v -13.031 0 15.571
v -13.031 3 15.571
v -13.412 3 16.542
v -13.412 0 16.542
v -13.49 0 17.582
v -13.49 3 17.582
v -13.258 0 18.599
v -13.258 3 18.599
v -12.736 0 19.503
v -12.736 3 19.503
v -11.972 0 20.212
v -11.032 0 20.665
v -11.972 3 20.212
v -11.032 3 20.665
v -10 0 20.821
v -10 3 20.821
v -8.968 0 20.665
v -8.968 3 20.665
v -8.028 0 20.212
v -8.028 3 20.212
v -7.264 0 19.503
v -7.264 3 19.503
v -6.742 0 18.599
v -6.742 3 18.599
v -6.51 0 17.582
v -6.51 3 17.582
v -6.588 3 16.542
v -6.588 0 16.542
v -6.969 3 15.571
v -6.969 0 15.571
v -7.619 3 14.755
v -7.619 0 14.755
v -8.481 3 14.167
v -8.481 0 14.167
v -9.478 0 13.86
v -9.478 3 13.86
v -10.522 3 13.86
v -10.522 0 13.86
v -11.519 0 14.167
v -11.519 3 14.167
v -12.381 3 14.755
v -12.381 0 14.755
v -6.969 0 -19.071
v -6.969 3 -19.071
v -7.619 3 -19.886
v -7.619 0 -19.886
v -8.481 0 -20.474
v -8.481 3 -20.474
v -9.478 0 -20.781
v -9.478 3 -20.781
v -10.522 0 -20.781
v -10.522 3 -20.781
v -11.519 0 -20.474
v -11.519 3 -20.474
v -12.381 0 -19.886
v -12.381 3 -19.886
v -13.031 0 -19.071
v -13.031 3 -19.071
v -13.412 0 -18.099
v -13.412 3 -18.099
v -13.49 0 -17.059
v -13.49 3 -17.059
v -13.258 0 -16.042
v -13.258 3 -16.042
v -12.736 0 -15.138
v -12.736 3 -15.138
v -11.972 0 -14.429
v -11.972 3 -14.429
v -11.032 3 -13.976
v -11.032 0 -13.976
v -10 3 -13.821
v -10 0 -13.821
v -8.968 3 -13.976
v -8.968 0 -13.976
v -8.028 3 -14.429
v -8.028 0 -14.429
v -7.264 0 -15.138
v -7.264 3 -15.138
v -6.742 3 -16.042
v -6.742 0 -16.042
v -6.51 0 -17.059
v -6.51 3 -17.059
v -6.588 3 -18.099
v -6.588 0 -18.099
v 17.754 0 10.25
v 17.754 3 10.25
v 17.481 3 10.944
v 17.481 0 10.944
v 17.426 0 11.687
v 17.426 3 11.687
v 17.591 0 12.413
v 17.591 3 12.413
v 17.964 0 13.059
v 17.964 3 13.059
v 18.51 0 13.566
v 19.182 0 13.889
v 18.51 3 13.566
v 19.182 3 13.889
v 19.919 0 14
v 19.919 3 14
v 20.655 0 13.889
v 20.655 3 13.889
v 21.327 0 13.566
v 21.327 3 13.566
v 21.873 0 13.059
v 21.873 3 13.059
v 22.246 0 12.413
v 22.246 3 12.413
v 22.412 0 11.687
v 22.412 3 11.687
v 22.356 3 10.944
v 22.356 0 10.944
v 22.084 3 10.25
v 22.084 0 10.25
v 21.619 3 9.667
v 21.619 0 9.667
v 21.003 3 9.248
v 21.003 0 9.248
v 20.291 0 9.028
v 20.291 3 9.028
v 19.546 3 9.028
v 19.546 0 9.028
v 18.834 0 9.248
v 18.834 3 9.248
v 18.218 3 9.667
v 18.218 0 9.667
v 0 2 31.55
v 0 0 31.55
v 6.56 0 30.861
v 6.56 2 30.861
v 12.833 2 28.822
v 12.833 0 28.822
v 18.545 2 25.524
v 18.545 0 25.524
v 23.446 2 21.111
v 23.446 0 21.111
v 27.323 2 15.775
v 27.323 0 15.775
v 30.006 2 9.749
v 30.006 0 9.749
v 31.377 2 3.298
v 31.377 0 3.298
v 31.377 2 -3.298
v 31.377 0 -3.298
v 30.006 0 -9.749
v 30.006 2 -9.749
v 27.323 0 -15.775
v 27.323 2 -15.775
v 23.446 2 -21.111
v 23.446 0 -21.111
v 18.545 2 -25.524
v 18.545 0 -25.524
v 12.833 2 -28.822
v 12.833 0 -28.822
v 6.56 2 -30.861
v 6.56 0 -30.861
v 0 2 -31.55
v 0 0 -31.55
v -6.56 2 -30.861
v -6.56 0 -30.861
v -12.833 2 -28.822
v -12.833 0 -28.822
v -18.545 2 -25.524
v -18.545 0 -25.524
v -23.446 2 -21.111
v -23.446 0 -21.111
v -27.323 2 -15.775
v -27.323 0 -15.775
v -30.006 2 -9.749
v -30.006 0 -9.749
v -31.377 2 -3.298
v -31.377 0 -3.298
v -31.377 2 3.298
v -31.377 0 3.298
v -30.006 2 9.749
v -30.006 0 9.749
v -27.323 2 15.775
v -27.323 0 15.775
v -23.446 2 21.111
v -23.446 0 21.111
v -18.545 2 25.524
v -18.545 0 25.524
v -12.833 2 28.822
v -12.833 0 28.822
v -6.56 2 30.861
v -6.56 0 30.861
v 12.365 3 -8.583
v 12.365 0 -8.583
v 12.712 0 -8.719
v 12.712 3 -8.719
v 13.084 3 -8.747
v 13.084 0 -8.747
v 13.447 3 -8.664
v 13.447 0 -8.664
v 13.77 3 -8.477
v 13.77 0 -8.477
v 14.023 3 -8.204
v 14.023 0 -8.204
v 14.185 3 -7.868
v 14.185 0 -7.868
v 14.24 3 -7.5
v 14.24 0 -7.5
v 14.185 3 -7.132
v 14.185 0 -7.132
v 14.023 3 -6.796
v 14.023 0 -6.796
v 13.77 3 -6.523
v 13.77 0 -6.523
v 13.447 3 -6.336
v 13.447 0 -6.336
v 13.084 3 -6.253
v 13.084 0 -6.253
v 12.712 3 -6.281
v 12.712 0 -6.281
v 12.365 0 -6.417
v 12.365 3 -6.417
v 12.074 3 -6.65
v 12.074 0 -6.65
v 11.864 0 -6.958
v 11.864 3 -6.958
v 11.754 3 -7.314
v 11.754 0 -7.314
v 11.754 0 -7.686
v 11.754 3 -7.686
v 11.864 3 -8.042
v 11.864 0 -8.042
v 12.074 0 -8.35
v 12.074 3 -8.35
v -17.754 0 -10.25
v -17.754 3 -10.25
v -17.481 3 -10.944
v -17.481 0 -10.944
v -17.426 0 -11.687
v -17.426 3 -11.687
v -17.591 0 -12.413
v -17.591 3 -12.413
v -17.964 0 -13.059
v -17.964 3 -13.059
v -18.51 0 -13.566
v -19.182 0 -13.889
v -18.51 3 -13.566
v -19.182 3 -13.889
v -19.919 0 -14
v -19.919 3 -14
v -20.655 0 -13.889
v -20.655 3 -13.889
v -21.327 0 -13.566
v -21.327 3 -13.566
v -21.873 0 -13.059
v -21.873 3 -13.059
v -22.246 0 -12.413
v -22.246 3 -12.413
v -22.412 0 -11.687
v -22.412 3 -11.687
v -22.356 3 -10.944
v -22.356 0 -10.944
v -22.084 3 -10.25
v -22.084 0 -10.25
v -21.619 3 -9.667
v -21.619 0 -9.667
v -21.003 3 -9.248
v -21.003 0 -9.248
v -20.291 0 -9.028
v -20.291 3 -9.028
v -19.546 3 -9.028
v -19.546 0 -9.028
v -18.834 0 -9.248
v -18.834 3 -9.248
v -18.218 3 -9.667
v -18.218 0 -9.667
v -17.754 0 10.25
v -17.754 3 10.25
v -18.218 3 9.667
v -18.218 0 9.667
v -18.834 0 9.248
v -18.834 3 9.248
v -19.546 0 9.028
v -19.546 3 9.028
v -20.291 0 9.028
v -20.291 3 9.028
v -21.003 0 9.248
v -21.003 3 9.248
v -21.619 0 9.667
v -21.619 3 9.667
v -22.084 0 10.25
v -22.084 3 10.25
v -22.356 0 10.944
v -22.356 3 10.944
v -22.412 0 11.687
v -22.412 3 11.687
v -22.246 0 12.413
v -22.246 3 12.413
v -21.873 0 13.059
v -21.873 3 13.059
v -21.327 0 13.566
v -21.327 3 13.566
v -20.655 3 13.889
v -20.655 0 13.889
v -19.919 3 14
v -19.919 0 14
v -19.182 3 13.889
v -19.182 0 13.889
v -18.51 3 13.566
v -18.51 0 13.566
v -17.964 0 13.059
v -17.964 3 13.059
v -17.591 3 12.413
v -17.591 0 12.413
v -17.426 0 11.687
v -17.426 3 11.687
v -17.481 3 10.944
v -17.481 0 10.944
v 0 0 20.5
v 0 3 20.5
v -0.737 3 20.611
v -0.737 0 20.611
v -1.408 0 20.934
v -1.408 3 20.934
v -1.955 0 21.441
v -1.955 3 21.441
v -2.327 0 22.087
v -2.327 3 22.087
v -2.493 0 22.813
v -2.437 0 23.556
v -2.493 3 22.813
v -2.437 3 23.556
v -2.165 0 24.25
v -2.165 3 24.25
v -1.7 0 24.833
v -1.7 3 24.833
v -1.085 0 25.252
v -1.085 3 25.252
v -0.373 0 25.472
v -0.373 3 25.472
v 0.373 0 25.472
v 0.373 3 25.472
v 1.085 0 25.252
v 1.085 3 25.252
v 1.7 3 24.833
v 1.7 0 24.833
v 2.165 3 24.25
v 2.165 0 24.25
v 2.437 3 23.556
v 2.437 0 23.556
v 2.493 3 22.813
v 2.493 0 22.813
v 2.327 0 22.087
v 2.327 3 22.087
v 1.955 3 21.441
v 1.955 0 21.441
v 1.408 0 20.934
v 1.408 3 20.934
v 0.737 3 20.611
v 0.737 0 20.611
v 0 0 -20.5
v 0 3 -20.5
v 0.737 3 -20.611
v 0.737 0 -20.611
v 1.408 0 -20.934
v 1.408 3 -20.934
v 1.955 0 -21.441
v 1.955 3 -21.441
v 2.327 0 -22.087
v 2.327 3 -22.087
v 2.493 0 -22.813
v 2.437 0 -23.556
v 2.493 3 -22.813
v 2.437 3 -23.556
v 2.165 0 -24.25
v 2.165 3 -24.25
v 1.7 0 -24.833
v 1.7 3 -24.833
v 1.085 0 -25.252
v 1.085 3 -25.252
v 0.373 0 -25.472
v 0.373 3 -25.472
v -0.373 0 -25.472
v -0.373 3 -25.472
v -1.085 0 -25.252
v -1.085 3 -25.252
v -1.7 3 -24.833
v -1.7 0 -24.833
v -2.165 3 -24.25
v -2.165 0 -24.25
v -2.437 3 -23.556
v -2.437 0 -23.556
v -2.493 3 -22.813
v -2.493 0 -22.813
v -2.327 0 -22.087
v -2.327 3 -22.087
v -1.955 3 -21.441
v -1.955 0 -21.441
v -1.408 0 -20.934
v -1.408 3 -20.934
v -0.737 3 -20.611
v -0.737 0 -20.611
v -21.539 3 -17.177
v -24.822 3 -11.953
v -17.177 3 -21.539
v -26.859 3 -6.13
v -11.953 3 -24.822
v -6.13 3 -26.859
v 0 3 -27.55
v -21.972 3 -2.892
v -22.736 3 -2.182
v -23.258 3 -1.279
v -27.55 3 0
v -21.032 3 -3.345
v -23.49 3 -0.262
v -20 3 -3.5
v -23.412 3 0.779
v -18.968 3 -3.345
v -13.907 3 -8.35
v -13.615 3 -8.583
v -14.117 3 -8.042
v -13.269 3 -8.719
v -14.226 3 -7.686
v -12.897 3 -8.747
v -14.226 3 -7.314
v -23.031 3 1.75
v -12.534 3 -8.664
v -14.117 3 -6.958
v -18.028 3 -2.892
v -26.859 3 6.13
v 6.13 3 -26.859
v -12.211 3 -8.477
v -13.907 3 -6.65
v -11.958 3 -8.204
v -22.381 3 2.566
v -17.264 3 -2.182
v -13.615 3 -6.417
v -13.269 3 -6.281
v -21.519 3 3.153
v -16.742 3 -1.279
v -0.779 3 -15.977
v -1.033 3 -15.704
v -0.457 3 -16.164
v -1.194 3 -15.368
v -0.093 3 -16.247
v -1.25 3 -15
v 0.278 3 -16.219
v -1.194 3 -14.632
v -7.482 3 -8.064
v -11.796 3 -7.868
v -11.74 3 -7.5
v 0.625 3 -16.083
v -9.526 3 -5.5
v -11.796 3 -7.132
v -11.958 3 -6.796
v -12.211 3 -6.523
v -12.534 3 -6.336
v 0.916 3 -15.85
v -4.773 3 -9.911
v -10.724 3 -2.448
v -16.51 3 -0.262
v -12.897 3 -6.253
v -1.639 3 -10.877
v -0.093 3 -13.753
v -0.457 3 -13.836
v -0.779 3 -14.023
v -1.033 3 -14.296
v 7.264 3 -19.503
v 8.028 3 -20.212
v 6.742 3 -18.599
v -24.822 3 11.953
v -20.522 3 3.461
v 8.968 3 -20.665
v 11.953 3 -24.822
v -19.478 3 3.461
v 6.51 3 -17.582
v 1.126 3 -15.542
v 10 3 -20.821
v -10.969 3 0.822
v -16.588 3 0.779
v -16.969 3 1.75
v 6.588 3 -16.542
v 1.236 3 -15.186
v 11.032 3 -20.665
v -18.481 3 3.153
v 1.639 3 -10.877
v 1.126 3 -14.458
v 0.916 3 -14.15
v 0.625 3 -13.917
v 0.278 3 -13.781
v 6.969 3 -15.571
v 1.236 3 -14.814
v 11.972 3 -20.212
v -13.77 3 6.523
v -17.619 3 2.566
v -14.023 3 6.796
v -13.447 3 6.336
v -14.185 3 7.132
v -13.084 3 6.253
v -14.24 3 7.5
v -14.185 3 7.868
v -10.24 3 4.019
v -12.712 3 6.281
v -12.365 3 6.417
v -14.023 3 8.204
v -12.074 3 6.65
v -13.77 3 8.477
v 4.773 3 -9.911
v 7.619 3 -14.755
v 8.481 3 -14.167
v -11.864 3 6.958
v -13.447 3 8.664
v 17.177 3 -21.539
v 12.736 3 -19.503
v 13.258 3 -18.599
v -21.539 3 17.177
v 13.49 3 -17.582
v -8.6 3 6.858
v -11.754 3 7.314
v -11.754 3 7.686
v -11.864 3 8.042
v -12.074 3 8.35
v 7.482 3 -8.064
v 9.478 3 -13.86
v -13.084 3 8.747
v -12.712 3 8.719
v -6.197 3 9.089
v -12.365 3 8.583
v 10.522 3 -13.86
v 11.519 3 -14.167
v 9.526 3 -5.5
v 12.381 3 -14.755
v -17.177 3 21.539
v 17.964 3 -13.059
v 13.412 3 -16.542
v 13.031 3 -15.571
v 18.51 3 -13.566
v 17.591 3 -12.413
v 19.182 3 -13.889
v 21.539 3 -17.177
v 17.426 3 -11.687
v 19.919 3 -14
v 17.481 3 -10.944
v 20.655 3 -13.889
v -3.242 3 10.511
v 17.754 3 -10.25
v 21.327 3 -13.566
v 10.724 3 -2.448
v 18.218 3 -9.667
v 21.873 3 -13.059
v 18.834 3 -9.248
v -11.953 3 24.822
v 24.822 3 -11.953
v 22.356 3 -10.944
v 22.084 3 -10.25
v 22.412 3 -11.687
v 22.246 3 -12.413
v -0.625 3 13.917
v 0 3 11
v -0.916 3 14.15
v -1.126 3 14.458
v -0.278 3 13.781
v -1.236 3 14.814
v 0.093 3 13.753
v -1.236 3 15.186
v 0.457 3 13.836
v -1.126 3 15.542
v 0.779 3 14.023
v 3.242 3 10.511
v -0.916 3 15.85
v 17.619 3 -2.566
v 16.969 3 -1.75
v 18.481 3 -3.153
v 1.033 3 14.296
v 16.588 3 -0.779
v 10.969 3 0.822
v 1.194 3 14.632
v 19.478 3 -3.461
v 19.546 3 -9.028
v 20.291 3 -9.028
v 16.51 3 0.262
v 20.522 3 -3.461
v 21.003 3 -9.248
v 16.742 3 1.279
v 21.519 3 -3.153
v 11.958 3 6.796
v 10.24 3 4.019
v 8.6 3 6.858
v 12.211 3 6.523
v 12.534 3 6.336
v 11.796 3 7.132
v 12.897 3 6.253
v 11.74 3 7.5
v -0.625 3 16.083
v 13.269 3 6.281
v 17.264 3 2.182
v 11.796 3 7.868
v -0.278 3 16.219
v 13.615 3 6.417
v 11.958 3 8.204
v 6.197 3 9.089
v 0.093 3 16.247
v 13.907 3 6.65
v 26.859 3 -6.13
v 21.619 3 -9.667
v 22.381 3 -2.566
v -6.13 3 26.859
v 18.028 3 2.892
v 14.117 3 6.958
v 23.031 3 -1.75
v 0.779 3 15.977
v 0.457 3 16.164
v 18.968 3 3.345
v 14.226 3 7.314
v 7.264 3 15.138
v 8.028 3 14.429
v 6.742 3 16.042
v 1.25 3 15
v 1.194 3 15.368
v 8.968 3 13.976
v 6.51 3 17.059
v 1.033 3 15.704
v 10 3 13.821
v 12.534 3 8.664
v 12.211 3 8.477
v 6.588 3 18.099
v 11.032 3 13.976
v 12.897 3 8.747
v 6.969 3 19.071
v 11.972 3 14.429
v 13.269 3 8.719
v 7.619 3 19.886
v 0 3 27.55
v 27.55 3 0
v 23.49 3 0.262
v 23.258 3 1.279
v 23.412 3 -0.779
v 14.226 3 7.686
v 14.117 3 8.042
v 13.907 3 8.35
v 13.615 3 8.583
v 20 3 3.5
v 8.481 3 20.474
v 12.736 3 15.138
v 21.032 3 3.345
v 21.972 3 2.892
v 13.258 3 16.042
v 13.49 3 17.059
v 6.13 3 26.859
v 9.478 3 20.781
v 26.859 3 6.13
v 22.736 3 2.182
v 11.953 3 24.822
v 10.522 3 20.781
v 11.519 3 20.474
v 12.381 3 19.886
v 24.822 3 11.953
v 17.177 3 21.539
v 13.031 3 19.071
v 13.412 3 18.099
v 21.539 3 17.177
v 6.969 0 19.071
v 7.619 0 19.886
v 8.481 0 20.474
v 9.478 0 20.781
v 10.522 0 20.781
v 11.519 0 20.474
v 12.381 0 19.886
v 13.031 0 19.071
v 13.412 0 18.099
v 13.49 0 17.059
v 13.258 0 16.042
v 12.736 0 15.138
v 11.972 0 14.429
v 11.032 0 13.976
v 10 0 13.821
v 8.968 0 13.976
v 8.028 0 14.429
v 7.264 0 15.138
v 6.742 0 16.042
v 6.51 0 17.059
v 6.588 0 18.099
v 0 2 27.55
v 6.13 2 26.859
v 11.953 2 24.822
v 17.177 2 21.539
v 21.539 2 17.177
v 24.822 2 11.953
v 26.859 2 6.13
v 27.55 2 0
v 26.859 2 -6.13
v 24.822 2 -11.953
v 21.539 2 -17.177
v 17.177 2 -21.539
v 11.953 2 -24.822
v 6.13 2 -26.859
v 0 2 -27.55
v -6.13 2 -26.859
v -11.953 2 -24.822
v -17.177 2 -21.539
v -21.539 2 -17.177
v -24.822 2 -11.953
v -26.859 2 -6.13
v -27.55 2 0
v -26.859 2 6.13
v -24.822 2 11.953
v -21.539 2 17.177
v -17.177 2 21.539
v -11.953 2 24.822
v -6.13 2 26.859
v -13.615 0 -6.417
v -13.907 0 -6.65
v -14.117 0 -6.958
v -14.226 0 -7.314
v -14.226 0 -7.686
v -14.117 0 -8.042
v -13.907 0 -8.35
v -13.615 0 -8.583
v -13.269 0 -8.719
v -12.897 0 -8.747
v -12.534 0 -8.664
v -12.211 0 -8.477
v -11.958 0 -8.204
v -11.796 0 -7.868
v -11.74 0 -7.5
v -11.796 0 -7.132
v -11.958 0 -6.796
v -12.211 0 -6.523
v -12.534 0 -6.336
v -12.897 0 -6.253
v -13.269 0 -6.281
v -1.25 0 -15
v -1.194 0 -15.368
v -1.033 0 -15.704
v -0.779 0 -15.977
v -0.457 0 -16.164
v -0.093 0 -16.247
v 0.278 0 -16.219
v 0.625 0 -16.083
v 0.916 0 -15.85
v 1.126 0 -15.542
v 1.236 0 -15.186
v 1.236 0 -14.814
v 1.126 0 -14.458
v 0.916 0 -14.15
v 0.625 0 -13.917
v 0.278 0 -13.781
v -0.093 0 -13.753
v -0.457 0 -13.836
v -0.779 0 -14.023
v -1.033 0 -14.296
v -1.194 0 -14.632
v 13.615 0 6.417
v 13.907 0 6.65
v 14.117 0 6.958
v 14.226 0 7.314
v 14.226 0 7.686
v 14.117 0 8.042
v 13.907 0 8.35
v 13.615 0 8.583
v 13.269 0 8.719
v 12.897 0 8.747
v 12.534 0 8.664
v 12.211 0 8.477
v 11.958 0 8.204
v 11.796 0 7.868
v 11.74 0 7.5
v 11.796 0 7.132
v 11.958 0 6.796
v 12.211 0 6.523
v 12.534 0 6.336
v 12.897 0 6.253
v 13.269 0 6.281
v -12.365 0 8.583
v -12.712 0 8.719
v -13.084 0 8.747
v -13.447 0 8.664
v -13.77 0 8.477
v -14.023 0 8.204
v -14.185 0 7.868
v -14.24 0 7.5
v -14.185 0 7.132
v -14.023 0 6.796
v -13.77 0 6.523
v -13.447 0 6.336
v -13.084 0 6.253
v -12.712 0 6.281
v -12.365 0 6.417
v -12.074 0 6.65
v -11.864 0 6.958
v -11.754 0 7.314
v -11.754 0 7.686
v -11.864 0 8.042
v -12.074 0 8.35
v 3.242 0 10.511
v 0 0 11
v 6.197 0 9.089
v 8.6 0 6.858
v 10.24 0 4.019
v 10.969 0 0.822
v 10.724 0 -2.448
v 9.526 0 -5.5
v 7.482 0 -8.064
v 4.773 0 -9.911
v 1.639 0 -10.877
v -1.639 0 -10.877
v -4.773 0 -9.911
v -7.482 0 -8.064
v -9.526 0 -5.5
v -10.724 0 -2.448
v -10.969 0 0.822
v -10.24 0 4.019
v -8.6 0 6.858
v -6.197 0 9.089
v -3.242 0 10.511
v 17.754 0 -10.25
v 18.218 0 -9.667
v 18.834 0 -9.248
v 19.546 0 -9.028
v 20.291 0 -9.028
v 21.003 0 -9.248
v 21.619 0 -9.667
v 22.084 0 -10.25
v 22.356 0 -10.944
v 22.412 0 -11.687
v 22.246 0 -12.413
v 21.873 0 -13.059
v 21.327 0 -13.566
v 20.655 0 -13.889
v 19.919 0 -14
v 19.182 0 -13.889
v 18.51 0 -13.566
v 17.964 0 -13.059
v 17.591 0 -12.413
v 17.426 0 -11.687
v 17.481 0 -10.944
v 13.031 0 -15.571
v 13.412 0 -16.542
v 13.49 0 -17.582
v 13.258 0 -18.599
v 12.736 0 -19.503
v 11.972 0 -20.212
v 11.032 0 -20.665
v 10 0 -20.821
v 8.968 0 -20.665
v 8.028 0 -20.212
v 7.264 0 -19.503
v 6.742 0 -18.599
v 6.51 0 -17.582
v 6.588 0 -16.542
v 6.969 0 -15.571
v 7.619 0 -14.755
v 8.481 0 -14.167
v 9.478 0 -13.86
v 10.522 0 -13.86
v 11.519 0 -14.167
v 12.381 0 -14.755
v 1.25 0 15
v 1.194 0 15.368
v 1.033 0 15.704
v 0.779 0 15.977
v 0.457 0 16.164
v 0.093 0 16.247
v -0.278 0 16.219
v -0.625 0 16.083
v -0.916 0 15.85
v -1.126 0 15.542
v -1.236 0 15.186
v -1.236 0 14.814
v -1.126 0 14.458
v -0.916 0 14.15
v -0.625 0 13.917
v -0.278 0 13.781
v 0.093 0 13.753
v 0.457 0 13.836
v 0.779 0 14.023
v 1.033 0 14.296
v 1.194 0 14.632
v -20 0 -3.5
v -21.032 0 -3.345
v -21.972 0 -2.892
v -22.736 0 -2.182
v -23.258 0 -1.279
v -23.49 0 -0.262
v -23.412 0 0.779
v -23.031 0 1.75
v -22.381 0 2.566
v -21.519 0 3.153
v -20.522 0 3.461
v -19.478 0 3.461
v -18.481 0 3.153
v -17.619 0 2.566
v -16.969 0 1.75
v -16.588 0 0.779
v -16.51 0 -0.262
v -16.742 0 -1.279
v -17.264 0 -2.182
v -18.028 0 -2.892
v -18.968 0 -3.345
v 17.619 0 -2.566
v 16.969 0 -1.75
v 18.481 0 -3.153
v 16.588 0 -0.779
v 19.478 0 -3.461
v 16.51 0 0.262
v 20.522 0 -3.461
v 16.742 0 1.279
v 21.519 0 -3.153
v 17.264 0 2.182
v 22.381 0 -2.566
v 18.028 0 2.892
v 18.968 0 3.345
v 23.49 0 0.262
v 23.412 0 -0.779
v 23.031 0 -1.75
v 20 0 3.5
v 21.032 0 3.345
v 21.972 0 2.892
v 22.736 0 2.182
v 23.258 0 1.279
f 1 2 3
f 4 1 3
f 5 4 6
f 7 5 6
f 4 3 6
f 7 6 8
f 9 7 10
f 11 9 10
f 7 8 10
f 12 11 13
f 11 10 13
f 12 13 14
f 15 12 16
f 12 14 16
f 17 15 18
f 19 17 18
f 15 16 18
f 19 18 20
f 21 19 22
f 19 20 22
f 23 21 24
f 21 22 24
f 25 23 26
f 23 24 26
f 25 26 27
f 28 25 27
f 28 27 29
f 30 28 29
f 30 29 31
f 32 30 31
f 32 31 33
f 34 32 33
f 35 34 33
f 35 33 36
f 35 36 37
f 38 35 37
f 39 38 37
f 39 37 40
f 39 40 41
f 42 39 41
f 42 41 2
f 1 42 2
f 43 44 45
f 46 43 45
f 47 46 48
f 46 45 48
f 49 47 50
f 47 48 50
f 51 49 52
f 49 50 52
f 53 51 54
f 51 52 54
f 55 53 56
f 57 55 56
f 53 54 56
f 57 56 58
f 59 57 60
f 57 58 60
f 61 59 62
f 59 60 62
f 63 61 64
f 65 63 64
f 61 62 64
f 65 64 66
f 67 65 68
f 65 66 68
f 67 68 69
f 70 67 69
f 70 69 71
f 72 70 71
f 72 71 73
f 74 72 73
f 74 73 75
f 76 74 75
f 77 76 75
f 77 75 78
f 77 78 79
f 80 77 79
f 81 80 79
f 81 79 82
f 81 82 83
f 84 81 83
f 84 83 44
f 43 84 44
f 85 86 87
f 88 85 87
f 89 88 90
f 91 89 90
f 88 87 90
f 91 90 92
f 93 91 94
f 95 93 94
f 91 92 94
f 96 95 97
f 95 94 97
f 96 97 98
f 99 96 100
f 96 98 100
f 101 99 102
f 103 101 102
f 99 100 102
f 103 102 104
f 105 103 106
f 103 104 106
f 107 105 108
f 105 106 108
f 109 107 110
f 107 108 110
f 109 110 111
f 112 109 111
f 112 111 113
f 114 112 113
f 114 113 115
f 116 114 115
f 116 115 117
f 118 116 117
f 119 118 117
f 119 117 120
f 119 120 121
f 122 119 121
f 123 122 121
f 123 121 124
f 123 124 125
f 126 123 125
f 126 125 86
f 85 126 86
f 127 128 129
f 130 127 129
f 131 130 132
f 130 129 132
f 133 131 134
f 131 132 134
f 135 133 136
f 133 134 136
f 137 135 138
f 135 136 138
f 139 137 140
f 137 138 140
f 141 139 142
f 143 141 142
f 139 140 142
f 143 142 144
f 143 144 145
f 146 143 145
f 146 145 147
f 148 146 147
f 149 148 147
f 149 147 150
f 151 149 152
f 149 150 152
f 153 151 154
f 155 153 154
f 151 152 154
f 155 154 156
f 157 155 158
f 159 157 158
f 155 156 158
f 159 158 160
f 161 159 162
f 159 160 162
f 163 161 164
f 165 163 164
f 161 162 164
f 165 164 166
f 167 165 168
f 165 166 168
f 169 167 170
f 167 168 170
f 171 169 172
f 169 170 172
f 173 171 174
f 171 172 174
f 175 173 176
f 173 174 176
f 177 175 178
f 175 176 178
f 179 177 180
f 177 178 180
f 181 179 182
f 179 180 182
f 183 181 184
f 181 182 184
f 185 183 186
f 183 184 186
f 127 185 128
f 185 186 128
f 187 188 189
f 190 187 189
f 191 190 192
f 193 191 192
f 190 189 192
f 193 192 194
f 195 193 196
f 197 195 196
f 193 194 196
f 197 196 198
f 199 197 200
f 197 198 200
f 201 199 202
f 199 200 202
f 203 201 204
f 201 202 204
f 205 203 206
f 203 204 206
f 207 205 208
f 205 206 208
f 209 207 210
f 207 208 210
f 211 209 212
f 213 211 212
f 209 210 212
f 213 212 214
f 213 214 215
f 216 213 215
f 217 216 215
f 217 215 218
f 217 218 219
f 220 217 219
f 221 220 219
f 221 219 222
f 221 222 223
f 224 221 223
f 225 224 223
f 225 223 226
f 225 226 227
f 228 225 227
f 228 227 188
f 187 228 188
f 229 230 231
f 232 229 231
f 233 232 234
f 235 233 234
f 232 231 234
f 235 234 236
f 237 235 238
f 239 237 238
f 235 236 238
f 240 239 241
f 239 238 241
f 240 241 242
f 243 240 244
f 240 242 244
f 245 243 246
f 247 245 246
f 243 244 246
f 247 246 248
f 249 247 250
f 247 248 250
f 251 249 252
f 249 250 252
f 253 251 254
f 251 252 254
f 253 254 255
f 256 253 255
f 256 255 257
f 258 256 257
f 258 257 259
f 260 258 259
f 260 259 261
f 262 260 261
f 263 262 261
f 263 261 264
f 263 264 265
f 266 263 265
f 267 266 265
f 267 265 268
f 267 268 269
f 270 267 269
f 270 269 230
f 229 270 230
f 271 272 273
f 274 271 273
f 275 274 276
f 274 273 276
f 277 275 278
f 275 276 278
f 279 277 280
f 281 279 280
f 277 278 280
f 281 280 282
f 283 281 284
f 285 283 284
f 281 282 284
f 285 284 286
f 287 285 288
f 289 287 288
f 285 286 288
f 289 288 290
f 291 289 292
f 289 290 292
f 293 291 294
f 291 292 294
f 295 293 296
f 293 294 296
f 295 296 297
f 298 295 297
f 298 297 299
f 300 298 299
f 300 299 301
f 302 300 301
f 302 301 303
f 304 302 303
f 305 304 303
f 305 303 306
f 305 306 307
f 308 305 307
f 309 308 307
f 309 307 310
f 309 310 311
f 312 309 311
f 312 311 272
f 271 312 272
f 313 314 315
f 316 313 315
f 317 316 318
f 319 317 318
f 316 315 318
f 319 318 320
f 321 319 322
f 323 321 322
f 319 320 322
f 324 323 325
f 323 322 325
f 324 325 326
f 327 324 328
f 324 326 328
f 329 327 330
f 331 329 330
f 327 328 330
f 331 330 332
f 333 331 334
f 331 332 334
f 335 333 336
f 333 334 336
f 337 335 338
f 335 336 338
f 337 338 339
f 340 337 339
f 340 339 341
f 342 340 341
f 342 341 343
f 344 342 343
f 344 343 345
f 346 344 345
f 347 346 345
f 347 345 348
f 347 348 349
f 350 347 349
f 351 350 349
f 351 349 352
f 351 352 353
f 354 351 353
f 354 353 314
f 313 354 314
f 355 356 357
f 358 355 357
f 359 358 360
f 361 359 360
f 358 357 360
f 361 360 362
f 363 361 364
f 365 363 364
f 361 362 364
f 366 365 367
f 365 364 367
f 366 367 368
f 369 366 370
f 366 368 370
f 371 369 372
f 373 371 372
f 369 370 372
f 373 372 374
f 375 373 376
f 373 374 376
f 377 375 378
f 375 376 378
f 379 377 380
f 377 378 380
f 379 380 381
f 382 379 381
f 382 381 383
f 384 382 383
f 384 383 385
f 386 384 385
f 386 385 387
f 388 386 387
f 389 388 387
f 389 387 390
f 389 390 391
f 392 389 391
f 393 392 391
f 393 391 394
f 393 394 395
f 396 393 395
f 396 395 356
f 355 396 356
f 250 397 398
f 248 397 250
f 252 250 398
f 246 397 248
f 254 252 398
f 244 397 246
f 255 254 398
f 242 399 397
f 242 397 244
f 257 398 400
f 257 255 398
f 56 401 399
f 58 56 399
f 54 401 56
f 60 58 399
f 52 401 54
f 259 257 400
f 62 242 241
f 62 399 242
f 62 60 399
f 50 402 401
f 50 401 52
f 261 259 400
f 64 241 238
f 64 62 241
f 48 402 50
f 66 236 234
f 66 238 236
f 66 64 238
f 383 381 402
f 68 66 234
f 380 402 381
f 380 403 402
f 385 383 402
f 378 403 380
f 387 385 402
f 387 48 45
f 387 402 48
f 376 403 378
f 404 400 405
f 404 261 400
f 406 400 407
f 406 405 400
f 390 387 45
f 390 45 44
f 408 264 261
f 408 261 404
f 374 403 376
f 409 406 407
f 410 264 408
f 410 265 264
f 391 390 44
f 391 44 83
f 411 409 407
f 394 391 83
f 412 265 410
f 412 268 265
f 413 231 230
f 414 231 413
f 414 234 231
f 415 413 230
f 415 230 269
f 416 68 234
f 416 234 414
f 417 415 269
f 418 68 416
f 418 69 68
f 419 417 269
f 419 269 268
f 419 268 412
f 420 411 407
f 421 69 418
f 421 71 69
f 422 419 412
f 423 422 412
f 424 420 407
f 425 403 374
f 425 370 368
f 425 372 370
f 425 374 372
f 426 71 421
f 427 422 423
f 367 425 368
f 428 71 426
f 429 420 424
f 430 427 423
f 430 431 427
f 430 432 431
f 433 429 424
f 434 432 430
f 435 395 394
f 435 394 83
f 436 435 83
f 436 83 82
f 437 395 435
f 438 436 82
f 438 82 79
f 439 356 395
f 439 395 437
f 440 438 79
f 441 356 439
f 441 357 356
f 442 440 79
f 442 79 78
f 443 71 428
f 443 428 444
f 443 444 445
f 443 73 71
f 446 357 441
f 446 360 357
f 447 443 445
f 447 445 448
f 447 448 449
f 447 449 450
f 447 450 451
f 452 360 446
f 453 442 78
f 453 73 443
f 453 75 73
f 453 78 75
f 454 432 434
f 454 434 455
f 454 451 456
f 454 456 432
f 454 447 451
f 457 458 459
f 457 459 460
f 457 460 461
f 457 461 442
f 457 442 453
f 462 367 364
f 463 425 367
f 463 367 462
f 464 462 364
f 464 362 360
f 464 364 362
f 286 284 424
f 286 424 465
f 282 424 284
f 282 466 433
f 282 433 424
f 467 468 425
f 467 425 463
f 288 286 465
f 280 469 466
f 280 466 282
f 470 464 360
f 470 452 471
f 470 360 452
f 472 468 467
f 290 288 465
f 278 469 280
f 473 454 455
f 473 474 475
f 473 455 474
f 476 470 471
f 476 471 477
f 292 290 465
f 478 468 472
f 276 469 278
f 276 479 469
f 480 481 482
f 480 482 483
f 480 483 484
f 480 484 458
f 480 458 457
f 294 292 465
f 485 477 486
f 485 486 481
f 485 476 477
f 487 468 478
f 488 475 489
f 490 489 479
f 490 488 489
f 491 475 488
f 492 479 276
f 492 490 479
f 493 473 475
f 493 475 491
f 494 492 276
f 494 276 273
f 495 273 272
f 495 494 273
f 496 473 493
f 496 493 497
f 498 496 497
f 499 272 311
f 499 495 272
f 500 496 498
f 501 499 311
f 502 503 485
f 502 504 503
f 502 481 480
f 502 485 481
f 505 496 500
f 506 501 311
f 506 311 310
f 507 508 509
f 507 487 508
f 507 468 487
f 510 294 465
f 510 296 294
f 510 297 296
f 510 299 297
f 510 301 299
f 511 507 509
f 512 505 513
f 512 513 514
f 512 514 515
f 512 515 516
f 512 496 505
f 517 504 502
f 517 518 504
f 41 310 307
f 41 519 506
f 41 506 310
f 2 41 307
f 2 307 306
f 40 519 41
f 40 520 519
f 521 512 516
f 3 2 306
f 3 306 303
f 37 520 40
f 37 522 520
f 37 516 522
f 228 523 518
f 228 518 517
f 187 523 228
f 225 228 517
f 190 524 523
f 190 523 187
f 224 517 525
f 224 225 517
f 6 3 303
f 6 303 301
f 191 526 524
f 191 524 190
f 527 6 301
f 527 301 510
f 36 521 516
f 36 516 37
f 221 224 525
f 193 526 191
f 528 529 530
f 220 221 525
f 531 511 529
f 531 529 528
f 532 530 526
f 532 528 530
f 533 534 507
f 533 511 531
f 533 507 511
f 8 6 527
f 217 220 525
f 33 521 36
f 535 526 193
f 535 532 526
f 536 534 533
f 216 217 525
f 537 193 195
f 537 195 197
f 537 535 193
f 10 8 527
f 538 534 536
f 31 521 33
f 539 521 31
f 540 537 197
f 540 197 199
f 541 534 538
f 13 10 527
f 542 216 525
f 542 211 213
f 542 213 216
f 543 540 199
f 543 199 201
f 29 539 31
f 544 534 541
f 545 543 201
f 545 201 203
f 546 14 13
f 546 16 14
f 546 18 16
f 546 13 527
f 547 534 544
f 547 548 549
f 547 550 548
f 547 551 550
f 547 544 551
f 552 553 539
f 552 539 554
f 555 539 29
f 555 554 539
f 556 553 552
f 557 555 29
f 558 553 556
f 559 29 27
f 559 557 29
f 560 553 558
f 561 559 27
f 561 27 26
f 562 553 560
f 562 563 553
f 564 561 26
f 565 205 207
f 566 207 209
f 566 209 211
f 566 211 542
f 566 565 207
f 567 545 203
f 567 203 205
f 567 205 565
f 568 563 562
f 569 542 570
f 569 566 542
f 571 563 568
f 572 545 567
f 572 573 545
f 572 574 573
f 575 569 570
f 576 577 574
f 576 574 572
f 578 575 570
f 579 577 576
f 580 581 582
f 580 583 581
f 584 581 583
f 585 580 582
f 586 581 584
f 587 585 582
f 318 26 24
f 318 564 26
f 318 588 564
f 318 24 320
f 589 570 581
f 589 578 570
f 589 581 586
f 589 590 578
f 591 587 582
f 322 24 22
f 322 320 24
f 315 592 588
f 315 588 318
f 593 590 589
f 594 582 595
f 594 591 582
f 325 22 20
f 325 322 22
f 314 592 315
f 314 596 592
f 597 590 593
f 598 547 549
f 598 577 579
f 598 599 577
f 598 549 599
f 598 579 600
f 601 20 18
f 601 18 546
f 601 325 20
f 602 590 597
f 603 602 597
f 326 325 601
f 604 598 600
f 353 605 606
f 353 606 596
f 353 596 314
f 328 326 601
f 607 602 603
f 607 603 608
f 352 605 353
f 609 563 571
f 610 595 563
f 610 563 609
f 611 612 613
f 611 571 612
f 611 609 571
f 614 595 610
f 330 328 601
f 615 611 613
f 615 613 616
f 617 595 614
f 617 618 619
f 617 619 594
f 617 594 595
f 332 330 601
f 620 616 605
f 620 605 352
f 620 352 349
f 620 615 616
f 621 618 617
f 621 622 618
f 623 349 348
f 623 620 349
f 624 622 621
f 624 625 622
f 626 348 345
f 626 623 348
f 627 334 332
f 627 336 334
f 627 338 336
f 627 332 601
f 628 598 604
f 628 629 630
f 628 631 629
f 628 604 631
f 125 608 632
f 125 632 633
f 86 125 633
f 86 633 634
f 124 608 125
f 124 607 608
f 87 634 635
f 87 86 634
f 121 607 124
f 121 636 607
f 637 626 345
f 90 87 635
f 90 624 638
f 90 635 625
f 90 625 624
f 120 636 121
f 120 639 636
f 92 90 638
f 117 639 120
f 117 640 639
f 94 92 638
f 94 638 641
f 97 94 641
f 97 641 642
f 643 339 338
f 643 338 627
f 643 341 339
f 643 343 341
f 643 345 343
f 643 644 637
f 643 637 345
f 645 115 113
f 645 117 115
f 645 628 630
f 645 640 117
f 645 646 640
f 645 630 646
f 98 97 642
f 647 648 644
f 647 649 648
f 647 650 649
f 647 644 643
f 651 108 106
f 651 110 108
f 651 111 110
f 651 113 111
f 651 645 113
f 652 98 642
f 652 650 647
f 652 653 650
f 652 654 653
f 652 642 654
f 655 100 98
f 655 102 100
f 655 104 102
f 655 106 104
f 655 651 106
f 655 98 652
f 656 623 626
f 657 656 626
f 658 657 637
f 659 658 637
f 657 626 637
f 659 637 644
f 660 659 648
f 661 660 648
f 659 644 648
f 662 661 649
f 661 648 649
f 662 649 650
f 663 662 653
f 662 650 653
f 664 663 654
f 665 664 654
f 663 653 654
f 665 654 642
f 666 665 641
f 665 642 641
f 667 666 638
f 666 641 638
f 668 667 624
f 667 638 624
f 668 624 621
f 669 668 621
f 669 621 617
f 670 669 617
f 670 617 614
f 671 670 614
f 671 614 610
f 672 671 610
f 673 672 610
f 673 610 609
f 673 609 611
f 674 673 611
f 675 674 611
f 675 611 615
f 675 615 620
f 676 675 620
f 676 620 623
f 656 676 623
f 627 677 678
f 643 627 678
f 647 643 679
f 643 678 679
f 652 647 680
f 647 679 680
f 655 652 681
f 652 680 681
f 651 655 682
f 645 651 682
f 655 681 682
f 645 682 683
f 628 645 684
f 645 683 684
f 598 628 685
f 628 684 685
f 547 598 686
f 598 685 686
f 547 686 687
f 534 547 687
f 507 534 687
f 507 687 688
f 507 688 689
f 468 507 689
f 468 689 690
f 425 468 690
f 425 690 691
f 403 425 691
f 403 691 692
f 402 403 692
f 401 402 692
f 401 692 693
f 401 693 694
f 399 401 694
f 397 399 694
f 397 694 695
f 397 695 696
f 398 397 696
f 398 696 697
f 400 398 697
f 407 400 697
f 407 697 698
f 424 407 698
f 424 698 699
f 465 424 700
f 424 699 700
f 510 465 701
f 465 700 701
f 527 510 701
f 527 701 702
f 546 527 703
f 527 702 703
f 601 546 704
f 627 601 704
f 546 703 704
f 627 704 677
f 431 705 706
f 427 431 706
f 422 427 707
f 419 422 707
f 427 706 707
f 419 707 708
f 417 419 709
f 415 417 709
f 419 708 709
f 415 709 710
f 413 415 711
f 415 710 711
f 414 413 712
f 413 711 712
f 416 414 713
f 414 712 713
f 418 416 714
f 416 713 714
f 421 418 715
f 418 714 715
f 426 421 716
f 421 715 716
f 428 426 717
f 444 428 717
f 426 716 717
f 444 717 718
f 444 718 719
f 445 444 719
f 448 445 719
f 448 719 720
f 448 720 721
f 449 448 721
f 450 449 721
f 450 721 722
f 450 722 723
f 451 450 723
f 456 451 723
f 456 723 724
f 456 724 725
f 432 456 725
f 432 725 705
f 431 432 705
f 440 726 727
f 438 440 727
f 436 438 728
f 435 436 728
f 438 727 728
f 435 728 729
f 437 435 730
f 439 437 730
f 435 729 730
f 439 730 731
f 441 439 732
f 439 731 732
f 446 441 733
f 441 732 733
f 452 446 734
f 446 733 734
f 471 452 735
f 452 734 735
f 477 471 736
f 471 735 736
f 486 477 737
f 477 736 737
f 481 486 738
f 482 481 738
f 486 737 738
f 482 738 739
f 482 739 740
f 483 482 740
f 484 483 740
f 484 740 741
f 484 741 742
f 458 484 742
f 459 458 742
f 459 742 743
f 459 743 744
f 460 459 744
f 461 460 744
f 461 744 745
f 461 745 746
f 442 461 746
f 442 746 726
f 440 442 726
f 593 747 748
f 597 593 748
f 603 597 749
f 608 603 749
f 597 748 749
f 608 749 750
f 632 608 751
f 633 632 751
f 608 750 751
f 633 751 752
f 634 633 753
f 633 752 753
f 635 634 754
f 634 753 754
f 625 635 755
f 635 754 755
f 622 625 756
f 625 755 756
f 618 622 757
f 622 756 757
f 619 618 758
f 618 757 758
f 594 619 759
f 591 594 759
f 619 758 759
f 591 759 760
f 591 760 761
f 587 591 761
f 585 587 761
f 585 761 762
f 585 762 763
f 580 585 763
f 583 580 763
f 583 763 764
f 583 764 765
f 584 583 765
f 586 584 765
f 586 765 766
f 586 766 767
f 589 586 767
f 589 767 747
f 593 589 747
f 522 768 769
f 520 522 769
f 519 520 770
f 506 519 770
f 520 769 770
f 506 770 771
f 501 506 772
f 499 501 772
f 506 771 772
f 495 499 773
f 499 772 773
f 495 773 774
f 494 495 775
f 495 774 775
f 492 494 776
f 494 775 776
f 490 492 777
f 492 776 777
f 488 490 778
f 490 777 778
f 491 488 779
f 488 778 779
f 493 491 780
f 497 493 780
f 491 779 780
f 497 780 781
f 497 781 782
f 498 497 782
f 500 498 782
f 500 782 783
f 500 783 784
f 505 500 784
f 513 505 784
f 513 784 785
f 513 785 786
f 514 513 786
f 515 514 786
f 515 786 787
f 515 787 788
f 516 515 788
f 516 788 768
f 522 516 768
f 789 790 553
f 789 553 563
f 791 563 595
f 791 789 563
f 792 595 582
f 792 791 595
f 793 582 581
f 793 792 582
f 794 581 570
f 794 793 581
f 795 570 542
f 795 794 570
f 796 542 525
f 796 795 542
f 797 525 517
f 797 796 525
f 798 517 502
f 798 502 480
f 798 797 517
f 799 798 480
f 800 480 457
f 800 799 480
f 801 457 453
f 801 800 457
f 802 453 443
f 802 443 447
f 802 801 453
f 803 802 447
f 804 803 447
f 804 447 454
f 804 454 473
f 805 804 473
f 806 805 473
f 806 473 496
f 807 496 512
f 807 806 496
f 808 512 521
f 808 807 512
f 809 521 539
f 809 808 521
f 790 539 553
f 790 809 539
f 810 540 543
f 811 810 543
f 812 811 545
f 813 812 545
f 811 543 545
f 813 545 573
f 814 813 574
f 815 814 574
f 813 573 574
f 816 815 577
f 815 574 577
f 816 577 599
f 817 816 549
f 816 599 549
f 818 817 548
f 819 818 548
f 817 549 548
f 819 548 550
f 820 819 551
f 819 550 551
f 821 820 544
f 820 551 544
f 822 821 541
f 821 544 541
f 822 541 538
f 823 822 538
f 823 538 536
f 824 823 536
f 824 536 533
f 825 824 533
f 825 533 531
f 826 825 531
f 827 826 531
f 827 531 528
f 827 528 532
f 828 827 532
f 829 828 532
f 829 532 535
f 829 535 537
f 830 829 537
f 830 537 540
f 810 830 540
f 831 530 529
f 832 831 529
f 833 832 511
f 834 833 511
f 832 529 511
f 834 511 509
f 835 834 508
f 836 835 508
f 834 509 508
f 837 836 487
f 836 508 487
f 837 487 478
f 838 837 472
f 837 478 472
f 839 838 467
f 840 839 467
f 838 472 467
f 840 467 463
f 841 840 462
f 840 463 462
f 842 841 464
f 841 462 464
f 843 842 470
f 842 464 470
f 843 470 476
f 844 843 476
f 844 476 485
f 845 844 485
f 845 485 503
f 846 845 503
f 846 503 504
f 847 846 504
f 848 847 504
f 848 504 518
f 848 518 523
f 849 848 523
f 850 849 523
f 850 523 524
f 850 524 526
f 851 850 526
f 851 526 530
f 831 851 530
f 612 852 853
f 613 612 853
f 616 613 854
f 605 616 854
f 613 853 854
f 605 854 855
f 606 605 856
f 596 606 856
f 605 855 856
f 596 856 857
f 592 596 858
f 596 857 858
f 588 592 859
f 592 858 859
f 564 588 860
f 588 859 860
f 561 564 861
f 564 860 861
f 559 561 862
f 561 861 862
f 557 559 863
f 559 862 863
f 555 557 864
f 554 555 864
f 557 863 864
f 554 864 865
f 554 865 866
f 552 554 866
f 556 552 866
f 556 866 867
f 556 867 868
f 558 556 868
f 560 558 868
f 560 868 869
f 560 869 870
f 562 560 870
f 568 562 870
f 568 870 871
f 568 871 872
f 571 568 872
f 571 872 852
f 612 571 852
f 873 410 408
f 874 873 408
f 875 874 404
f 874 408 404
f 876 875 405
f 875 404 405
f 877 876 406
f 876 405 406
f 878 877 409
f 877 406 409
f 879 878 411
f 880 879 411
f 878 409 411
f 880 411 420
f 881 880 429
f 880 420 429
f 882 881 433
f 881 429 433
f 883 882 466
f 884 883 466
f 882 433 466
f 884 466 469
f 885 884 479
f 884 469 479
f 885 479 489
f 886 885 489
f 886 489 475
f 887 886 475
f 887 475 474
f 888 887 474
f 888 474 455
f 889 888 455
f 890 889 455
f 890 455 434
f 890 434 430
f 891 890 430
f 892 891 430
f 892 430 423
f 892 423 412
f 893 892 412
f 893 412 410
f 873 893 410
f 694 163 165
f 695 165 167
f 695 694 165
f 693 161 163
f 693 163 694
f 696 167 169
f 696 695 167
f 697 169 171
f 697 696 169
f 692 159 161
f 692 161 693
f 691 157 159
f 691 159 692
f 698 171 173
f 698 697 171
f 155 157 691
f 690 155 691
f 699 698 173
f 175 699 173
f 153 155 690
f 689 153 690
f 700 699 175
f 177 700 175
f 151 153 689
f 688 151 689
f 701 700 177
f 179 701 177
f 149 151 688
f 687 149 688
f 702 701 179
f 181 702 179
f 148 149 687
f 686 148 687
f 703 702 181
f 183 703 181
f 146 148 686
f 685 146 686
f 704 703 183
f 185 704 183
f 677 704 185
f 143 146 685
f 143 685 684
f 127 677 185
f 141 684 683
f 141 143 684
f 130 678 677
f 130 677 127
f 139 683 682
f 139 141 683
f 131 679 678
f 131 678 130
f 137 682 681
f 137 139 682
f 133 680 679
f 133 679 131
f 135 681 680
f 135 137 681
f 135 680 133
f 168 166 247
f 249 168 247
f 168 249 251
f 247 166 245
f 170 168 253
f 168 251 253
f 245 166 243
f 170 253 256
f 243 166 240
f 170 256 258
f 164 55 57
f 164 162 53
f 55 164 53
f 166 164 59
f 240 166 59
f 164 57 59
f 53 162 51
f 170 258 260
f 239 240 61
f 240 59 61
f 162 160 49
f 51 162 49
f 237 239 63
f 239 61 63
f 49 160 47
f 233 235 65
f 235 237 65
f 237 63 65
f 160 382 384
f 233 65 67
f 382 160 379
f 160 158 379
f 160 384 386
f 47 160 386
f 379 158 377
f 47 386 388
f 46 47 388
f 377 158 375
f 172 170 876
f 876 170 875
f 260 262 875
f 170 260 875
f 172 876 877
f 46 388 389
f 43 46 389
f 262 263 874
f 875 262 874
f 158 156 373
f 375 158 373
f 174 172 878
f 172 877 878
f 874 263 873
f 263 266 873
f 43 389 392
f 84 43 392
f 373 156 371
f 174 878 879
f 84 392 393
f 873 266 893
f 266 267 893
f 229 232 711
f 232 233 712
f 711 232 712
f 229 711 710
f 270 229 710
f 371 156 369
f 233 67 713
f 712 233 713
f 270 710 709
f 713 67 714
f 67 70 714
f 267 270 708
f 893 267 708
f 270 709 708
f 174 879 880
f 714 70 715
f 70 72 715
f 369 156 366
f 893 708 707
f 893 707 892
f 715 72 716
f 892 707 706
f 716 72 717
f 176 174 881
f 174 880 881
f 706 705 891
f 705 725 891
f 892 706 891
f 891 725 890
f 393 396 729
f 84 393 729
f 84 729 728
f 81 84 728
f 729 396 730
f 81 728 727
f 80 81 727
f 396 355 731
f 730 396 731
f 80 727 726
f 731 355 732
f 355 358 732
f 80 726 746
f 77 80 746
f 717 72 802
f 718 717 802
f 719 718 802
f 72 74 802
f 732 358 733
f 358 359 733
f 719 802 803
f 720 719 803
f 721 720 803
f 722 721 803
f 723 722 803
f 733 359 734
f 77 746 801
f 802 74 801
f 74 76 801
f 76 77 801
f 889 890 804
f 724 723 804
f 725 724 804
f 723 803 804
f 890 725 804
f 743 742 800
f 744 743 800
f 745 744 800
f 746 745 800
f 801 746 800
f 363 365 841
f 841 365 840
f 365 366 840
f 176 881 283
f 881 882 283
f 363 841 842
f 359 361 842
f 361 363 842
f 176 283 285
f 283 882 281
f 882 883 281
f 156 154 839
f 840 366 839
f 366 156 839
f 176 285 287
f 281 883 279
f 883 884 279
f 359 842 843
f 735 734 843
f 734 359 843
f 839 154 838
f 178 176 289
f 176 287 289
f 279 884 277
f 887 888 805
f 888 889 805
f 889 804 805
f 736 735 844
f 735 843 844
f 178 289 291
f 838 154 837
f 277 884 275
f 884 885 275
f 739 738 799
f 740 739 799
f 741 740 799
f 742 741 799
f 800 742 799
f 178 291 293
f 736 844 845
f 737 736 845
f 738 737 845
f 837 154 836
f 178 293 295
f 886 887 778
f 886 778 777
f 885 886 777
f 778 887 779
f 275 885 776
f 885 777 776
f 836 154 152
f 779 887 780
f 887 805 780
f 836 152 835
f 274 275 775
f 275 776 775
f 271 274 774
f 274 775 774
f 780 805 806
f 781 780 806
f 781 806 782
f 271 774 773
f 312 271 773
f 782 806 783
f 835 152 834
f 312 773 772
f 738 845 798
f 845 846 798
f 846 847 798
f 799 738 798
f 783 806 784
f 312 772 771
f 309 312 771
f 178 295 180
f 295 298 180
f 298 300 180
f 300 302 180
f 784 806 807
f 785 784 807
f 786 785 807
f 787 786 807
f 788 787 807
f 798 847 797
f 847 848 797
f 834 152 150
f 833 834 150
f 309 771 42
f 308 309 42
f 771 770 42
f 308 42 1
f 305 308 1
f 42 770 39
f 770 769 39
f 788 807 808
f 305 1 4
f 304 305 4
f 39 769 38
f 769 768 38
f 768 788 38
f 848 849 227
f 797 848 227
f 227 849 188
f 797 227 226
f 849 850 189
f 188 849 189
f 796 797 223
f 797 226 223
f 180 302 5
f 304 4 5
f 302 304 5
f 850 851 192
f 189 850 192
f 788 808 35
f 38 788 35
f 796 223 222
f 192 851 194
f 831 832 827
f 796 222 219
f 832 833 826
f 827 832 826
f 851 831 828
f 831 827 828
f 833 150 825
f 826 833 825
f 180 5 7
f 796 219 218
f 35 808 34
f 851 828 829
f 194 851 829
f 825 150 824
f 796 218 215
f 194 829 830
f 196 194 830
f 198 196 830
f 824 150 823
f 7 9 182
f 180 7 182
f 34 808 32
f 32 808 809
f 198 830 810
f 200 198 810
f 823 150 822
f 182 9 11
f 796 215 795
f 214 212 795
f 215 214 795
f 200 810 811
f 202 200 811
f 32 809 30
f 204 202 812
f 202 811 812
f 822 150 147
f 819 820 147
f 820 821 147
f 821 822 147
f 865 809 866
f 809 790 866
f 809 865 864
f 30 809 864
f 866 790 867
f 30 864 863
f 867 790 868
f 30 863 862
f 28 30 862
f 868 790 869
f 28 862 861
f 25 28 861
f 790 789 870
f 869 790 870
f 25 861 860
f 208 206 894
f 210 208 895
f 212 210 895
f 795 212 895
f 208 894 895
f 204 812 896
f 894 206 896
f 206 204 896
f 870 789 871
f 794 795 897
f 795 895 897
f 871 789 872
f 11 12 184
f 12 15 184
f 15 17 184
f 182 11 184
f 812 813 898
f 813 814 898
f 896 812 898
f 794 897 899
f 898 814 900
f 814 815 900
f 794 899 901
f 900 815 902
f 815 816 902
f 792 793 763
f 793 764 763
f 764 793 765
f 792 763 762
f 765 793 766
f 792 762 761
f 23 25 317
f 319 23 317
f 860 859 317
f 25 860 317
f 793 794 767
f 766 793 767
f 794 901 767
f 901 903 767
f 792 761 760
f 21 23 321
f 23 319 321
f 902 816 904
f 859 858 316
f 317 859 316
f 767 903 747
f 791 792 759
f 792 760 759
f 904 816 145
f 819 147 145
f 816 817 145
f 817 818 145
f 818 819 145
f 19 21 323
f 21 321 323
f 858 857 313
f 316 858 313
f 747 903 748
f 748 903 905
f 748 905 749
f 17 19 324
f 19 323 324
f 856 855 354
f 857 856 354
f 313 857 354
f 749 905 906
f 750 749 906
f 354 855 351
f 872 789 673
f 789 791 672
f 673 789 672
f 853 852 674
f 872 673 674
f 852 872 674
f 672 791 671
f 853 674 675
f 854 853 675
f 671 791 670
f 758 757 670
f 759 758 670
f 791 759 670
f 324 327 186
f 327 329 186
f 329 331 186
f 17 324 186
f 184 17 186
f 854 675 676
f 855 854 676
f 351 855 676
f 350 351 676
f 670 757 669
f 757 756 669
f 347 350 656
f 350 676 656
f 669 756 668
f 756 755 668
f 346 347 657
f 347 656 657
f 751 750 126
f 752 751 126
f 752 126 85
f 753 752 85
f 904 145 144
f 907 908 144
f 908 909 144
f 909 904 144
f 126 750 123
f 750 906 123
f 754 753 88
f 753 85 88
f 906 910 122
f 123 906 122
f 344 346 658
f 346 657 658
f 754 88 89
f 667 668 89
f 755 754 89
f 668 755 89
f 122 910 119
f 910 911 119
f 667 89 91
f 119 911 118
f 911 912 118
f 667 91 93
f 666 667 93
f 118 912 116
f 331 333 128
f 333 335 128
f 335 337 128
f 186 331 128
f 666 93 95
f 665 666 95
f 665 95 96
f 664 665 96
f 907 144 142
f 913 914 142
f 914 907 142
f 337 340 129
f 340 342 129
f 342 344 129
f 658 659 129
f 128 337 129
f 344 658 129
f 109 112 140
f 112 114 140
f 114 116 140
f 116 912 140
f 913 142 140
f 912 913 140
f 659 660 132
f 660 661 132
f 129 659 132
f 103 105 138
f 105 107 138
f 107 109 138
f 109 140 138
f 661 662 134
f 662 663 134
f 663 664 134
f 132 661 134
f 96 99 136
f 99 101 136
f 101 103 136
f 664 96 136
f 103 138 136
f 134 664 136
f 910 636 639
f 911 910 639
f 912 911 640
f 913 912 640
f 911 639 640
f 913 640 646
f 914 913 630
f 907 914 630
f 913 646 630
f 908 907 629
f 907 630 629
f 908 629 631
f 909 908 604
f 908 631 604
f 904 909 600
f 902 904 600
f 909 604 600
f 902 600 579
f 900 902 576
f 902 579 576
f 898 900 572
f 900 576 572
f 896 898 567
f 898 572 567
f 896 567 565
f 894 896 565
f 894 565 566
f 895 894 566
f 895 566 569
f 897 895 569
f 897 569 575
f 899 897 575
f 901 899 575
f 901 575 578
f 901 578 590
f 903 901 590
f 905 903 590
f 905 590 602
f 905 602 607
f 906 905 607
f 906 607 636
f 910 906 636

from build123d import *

# Parameters (mm, degrees)
SKETCH1_R             = 27.55
SKETCH1_R_2           = 11
BOSS_EXTRUDE1_DEPTH   = 3
SKETCH1_3_R           = 31.55
SKETCH1_3_R_2         = 27.55
BOSS_EXTRUDE2_DEPTH   = 2
M3X0_5_TAPPED_HOLE1_D = 2.5
SKETCH6_R             = 3.5
SKETCH6_R_2           = 2.5
CUT_EXTRUDE1_DEPTH    = 45.719179331
CIRPATTERN1_COUNT     = 6


with BuildPart() as part:
    # Sketch1 → Boss-Extrude1 (new body)
    with BuildSketch(Plane(origin=(0, 0, 0), x_dir=(1, 0, 0), z_dir=(0, 1, 0))):
        Circle(SKETCH1_R)
        Circle(SKETCH1_R_2, mode=Mode.SUBTRACT)
    extrude(amount=BOSS_EXTRUDE1_DEPTH)

    # Sketch1<3> → Boss-Extrude2 (add)
    with BuildSketch(Plane(origin=(0, 0, 0), x_dir=(1, 0, 0), z_dir=(0, 1, 0))):
        Circle(SKETCH1_3_R)
        Circle(SKETCH1_3_R_2, mode=Mode.SUBTRACT)
    extrude(amount=BOSS_EXTRUDE2_DEPTH)

    # M3x0.5 Tapped Hole1 (through all)
    with Locations(Plane(origin=(0, 3, 0), x_dir=(1, 0, 0), z_dir=(0, 1, 0))):
        with Locations((0, 15)):
            m3x0_5_tapped_hole1 = Hole(M3X0_5_TAPPED_HOLE1_D / 2)

    # Sketch6 → Cut-Extrude1 (cut, through all)
    with BuildSketch(Plane(origin=(0, 3, 0), x_dir=(1, 0, 0), z_dir=(0, 1, 0))):
        with Locations((20, 0)):
            Circle(SKETCH6_R)
        with Locations((0, 23)):
            Circle(SKETCH6_R_2)
    cut_extrude1 = extrude(amount=-CUT_EXTRUDE1_DEPTH, mode=Mode.SUBTRACT)

    # CirPattern1: M3x0.5 Tapped Hole1, Cut-Extrude1 ×6 about axis
    cirpattern1_axis = Axis((0, 3, 0), (0, -1, 0))
    add([m3x0_5_tapped_hole1.rotate(cirpattern1_axis, i * 360 / CIRPATTERN1_COUNT) for i in range(1, CIRPATTERN1_COUNT)], mode=Mode.SUBTRACT)
    add([cut_extrude1.rotate(cirpattern1_axis, i * 360 / CIRPATTERN1_COUNT) for i in range(1, CIRPATTERN1_COUNT)], mode=Mode.SUBTRACT)


solid = part.part
